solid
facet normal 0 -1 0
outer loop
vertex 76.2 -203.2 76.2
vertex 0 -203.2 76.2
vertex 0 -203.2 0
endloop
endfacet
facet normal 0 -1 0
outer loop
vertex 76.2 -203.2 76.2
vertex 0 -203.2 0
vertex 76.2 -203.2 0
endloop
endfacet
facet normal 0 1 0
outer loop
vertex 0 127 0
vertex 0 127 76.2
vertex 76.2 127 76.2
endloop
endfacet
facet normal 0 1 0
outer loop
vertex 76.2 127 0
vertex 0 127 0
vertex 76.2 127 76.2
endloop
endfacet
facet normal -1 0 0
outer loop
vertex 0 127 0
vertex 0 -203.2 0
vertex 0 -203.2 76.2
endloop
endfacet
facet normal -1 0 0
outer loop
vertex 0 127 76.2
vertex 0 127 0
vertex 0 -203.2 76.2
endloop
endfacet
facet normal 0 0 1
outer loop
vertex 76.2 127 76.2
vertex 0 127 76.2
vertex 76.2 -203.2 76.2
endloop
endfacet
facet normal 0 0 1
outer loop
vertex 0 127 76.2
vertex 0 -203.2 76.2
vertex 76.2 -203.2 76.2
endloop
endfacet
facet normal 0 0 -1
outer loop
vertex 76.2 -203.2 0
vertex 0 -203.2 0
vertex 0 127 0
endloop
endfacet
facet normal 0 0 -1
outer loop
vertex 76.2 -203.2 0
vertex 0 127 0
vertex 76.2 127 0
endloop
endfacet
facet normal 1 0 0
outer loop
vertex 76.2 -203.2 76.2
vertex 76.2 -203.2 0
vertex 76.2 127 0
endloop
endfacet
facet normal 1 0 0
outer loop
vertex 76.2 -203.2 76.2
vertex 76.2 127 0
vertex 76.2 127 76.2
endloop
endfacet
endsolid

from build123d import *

# Parameters (mm, degrees)
F0_W     = 76.2
F0_H     = 76.2
F1_DEPTH = 127
F2_DEPTH = 76.2
F3_DEPTH = 127


with BuildPart() as f1:
    # F0 (on Front) → F1 (new body)
    with BuildSketch(Plane.XZ):
        with Locations((38.1, 38.1)):
            Rectangle(F0_W, F0_H)
    extrude(amount=F1_DEPTH)

    # F2 (add): a face of the model
    f2_faces = [f1.faces().sort_by_distance(p)[0] for p in [
        (38.1, -127, 38.1),
    ]]
    extrude(f2_faces, amount=F2_DEPTH)

    # F3 (add): a face of the model
    f3_faces = [f1.faces().sort_by_distance(p)[0] for p in [
        (38.1, 0, 38.1),
    ]]
    extrude(f3_faces, amount=F3_DEPTH)


solid = f1.part
